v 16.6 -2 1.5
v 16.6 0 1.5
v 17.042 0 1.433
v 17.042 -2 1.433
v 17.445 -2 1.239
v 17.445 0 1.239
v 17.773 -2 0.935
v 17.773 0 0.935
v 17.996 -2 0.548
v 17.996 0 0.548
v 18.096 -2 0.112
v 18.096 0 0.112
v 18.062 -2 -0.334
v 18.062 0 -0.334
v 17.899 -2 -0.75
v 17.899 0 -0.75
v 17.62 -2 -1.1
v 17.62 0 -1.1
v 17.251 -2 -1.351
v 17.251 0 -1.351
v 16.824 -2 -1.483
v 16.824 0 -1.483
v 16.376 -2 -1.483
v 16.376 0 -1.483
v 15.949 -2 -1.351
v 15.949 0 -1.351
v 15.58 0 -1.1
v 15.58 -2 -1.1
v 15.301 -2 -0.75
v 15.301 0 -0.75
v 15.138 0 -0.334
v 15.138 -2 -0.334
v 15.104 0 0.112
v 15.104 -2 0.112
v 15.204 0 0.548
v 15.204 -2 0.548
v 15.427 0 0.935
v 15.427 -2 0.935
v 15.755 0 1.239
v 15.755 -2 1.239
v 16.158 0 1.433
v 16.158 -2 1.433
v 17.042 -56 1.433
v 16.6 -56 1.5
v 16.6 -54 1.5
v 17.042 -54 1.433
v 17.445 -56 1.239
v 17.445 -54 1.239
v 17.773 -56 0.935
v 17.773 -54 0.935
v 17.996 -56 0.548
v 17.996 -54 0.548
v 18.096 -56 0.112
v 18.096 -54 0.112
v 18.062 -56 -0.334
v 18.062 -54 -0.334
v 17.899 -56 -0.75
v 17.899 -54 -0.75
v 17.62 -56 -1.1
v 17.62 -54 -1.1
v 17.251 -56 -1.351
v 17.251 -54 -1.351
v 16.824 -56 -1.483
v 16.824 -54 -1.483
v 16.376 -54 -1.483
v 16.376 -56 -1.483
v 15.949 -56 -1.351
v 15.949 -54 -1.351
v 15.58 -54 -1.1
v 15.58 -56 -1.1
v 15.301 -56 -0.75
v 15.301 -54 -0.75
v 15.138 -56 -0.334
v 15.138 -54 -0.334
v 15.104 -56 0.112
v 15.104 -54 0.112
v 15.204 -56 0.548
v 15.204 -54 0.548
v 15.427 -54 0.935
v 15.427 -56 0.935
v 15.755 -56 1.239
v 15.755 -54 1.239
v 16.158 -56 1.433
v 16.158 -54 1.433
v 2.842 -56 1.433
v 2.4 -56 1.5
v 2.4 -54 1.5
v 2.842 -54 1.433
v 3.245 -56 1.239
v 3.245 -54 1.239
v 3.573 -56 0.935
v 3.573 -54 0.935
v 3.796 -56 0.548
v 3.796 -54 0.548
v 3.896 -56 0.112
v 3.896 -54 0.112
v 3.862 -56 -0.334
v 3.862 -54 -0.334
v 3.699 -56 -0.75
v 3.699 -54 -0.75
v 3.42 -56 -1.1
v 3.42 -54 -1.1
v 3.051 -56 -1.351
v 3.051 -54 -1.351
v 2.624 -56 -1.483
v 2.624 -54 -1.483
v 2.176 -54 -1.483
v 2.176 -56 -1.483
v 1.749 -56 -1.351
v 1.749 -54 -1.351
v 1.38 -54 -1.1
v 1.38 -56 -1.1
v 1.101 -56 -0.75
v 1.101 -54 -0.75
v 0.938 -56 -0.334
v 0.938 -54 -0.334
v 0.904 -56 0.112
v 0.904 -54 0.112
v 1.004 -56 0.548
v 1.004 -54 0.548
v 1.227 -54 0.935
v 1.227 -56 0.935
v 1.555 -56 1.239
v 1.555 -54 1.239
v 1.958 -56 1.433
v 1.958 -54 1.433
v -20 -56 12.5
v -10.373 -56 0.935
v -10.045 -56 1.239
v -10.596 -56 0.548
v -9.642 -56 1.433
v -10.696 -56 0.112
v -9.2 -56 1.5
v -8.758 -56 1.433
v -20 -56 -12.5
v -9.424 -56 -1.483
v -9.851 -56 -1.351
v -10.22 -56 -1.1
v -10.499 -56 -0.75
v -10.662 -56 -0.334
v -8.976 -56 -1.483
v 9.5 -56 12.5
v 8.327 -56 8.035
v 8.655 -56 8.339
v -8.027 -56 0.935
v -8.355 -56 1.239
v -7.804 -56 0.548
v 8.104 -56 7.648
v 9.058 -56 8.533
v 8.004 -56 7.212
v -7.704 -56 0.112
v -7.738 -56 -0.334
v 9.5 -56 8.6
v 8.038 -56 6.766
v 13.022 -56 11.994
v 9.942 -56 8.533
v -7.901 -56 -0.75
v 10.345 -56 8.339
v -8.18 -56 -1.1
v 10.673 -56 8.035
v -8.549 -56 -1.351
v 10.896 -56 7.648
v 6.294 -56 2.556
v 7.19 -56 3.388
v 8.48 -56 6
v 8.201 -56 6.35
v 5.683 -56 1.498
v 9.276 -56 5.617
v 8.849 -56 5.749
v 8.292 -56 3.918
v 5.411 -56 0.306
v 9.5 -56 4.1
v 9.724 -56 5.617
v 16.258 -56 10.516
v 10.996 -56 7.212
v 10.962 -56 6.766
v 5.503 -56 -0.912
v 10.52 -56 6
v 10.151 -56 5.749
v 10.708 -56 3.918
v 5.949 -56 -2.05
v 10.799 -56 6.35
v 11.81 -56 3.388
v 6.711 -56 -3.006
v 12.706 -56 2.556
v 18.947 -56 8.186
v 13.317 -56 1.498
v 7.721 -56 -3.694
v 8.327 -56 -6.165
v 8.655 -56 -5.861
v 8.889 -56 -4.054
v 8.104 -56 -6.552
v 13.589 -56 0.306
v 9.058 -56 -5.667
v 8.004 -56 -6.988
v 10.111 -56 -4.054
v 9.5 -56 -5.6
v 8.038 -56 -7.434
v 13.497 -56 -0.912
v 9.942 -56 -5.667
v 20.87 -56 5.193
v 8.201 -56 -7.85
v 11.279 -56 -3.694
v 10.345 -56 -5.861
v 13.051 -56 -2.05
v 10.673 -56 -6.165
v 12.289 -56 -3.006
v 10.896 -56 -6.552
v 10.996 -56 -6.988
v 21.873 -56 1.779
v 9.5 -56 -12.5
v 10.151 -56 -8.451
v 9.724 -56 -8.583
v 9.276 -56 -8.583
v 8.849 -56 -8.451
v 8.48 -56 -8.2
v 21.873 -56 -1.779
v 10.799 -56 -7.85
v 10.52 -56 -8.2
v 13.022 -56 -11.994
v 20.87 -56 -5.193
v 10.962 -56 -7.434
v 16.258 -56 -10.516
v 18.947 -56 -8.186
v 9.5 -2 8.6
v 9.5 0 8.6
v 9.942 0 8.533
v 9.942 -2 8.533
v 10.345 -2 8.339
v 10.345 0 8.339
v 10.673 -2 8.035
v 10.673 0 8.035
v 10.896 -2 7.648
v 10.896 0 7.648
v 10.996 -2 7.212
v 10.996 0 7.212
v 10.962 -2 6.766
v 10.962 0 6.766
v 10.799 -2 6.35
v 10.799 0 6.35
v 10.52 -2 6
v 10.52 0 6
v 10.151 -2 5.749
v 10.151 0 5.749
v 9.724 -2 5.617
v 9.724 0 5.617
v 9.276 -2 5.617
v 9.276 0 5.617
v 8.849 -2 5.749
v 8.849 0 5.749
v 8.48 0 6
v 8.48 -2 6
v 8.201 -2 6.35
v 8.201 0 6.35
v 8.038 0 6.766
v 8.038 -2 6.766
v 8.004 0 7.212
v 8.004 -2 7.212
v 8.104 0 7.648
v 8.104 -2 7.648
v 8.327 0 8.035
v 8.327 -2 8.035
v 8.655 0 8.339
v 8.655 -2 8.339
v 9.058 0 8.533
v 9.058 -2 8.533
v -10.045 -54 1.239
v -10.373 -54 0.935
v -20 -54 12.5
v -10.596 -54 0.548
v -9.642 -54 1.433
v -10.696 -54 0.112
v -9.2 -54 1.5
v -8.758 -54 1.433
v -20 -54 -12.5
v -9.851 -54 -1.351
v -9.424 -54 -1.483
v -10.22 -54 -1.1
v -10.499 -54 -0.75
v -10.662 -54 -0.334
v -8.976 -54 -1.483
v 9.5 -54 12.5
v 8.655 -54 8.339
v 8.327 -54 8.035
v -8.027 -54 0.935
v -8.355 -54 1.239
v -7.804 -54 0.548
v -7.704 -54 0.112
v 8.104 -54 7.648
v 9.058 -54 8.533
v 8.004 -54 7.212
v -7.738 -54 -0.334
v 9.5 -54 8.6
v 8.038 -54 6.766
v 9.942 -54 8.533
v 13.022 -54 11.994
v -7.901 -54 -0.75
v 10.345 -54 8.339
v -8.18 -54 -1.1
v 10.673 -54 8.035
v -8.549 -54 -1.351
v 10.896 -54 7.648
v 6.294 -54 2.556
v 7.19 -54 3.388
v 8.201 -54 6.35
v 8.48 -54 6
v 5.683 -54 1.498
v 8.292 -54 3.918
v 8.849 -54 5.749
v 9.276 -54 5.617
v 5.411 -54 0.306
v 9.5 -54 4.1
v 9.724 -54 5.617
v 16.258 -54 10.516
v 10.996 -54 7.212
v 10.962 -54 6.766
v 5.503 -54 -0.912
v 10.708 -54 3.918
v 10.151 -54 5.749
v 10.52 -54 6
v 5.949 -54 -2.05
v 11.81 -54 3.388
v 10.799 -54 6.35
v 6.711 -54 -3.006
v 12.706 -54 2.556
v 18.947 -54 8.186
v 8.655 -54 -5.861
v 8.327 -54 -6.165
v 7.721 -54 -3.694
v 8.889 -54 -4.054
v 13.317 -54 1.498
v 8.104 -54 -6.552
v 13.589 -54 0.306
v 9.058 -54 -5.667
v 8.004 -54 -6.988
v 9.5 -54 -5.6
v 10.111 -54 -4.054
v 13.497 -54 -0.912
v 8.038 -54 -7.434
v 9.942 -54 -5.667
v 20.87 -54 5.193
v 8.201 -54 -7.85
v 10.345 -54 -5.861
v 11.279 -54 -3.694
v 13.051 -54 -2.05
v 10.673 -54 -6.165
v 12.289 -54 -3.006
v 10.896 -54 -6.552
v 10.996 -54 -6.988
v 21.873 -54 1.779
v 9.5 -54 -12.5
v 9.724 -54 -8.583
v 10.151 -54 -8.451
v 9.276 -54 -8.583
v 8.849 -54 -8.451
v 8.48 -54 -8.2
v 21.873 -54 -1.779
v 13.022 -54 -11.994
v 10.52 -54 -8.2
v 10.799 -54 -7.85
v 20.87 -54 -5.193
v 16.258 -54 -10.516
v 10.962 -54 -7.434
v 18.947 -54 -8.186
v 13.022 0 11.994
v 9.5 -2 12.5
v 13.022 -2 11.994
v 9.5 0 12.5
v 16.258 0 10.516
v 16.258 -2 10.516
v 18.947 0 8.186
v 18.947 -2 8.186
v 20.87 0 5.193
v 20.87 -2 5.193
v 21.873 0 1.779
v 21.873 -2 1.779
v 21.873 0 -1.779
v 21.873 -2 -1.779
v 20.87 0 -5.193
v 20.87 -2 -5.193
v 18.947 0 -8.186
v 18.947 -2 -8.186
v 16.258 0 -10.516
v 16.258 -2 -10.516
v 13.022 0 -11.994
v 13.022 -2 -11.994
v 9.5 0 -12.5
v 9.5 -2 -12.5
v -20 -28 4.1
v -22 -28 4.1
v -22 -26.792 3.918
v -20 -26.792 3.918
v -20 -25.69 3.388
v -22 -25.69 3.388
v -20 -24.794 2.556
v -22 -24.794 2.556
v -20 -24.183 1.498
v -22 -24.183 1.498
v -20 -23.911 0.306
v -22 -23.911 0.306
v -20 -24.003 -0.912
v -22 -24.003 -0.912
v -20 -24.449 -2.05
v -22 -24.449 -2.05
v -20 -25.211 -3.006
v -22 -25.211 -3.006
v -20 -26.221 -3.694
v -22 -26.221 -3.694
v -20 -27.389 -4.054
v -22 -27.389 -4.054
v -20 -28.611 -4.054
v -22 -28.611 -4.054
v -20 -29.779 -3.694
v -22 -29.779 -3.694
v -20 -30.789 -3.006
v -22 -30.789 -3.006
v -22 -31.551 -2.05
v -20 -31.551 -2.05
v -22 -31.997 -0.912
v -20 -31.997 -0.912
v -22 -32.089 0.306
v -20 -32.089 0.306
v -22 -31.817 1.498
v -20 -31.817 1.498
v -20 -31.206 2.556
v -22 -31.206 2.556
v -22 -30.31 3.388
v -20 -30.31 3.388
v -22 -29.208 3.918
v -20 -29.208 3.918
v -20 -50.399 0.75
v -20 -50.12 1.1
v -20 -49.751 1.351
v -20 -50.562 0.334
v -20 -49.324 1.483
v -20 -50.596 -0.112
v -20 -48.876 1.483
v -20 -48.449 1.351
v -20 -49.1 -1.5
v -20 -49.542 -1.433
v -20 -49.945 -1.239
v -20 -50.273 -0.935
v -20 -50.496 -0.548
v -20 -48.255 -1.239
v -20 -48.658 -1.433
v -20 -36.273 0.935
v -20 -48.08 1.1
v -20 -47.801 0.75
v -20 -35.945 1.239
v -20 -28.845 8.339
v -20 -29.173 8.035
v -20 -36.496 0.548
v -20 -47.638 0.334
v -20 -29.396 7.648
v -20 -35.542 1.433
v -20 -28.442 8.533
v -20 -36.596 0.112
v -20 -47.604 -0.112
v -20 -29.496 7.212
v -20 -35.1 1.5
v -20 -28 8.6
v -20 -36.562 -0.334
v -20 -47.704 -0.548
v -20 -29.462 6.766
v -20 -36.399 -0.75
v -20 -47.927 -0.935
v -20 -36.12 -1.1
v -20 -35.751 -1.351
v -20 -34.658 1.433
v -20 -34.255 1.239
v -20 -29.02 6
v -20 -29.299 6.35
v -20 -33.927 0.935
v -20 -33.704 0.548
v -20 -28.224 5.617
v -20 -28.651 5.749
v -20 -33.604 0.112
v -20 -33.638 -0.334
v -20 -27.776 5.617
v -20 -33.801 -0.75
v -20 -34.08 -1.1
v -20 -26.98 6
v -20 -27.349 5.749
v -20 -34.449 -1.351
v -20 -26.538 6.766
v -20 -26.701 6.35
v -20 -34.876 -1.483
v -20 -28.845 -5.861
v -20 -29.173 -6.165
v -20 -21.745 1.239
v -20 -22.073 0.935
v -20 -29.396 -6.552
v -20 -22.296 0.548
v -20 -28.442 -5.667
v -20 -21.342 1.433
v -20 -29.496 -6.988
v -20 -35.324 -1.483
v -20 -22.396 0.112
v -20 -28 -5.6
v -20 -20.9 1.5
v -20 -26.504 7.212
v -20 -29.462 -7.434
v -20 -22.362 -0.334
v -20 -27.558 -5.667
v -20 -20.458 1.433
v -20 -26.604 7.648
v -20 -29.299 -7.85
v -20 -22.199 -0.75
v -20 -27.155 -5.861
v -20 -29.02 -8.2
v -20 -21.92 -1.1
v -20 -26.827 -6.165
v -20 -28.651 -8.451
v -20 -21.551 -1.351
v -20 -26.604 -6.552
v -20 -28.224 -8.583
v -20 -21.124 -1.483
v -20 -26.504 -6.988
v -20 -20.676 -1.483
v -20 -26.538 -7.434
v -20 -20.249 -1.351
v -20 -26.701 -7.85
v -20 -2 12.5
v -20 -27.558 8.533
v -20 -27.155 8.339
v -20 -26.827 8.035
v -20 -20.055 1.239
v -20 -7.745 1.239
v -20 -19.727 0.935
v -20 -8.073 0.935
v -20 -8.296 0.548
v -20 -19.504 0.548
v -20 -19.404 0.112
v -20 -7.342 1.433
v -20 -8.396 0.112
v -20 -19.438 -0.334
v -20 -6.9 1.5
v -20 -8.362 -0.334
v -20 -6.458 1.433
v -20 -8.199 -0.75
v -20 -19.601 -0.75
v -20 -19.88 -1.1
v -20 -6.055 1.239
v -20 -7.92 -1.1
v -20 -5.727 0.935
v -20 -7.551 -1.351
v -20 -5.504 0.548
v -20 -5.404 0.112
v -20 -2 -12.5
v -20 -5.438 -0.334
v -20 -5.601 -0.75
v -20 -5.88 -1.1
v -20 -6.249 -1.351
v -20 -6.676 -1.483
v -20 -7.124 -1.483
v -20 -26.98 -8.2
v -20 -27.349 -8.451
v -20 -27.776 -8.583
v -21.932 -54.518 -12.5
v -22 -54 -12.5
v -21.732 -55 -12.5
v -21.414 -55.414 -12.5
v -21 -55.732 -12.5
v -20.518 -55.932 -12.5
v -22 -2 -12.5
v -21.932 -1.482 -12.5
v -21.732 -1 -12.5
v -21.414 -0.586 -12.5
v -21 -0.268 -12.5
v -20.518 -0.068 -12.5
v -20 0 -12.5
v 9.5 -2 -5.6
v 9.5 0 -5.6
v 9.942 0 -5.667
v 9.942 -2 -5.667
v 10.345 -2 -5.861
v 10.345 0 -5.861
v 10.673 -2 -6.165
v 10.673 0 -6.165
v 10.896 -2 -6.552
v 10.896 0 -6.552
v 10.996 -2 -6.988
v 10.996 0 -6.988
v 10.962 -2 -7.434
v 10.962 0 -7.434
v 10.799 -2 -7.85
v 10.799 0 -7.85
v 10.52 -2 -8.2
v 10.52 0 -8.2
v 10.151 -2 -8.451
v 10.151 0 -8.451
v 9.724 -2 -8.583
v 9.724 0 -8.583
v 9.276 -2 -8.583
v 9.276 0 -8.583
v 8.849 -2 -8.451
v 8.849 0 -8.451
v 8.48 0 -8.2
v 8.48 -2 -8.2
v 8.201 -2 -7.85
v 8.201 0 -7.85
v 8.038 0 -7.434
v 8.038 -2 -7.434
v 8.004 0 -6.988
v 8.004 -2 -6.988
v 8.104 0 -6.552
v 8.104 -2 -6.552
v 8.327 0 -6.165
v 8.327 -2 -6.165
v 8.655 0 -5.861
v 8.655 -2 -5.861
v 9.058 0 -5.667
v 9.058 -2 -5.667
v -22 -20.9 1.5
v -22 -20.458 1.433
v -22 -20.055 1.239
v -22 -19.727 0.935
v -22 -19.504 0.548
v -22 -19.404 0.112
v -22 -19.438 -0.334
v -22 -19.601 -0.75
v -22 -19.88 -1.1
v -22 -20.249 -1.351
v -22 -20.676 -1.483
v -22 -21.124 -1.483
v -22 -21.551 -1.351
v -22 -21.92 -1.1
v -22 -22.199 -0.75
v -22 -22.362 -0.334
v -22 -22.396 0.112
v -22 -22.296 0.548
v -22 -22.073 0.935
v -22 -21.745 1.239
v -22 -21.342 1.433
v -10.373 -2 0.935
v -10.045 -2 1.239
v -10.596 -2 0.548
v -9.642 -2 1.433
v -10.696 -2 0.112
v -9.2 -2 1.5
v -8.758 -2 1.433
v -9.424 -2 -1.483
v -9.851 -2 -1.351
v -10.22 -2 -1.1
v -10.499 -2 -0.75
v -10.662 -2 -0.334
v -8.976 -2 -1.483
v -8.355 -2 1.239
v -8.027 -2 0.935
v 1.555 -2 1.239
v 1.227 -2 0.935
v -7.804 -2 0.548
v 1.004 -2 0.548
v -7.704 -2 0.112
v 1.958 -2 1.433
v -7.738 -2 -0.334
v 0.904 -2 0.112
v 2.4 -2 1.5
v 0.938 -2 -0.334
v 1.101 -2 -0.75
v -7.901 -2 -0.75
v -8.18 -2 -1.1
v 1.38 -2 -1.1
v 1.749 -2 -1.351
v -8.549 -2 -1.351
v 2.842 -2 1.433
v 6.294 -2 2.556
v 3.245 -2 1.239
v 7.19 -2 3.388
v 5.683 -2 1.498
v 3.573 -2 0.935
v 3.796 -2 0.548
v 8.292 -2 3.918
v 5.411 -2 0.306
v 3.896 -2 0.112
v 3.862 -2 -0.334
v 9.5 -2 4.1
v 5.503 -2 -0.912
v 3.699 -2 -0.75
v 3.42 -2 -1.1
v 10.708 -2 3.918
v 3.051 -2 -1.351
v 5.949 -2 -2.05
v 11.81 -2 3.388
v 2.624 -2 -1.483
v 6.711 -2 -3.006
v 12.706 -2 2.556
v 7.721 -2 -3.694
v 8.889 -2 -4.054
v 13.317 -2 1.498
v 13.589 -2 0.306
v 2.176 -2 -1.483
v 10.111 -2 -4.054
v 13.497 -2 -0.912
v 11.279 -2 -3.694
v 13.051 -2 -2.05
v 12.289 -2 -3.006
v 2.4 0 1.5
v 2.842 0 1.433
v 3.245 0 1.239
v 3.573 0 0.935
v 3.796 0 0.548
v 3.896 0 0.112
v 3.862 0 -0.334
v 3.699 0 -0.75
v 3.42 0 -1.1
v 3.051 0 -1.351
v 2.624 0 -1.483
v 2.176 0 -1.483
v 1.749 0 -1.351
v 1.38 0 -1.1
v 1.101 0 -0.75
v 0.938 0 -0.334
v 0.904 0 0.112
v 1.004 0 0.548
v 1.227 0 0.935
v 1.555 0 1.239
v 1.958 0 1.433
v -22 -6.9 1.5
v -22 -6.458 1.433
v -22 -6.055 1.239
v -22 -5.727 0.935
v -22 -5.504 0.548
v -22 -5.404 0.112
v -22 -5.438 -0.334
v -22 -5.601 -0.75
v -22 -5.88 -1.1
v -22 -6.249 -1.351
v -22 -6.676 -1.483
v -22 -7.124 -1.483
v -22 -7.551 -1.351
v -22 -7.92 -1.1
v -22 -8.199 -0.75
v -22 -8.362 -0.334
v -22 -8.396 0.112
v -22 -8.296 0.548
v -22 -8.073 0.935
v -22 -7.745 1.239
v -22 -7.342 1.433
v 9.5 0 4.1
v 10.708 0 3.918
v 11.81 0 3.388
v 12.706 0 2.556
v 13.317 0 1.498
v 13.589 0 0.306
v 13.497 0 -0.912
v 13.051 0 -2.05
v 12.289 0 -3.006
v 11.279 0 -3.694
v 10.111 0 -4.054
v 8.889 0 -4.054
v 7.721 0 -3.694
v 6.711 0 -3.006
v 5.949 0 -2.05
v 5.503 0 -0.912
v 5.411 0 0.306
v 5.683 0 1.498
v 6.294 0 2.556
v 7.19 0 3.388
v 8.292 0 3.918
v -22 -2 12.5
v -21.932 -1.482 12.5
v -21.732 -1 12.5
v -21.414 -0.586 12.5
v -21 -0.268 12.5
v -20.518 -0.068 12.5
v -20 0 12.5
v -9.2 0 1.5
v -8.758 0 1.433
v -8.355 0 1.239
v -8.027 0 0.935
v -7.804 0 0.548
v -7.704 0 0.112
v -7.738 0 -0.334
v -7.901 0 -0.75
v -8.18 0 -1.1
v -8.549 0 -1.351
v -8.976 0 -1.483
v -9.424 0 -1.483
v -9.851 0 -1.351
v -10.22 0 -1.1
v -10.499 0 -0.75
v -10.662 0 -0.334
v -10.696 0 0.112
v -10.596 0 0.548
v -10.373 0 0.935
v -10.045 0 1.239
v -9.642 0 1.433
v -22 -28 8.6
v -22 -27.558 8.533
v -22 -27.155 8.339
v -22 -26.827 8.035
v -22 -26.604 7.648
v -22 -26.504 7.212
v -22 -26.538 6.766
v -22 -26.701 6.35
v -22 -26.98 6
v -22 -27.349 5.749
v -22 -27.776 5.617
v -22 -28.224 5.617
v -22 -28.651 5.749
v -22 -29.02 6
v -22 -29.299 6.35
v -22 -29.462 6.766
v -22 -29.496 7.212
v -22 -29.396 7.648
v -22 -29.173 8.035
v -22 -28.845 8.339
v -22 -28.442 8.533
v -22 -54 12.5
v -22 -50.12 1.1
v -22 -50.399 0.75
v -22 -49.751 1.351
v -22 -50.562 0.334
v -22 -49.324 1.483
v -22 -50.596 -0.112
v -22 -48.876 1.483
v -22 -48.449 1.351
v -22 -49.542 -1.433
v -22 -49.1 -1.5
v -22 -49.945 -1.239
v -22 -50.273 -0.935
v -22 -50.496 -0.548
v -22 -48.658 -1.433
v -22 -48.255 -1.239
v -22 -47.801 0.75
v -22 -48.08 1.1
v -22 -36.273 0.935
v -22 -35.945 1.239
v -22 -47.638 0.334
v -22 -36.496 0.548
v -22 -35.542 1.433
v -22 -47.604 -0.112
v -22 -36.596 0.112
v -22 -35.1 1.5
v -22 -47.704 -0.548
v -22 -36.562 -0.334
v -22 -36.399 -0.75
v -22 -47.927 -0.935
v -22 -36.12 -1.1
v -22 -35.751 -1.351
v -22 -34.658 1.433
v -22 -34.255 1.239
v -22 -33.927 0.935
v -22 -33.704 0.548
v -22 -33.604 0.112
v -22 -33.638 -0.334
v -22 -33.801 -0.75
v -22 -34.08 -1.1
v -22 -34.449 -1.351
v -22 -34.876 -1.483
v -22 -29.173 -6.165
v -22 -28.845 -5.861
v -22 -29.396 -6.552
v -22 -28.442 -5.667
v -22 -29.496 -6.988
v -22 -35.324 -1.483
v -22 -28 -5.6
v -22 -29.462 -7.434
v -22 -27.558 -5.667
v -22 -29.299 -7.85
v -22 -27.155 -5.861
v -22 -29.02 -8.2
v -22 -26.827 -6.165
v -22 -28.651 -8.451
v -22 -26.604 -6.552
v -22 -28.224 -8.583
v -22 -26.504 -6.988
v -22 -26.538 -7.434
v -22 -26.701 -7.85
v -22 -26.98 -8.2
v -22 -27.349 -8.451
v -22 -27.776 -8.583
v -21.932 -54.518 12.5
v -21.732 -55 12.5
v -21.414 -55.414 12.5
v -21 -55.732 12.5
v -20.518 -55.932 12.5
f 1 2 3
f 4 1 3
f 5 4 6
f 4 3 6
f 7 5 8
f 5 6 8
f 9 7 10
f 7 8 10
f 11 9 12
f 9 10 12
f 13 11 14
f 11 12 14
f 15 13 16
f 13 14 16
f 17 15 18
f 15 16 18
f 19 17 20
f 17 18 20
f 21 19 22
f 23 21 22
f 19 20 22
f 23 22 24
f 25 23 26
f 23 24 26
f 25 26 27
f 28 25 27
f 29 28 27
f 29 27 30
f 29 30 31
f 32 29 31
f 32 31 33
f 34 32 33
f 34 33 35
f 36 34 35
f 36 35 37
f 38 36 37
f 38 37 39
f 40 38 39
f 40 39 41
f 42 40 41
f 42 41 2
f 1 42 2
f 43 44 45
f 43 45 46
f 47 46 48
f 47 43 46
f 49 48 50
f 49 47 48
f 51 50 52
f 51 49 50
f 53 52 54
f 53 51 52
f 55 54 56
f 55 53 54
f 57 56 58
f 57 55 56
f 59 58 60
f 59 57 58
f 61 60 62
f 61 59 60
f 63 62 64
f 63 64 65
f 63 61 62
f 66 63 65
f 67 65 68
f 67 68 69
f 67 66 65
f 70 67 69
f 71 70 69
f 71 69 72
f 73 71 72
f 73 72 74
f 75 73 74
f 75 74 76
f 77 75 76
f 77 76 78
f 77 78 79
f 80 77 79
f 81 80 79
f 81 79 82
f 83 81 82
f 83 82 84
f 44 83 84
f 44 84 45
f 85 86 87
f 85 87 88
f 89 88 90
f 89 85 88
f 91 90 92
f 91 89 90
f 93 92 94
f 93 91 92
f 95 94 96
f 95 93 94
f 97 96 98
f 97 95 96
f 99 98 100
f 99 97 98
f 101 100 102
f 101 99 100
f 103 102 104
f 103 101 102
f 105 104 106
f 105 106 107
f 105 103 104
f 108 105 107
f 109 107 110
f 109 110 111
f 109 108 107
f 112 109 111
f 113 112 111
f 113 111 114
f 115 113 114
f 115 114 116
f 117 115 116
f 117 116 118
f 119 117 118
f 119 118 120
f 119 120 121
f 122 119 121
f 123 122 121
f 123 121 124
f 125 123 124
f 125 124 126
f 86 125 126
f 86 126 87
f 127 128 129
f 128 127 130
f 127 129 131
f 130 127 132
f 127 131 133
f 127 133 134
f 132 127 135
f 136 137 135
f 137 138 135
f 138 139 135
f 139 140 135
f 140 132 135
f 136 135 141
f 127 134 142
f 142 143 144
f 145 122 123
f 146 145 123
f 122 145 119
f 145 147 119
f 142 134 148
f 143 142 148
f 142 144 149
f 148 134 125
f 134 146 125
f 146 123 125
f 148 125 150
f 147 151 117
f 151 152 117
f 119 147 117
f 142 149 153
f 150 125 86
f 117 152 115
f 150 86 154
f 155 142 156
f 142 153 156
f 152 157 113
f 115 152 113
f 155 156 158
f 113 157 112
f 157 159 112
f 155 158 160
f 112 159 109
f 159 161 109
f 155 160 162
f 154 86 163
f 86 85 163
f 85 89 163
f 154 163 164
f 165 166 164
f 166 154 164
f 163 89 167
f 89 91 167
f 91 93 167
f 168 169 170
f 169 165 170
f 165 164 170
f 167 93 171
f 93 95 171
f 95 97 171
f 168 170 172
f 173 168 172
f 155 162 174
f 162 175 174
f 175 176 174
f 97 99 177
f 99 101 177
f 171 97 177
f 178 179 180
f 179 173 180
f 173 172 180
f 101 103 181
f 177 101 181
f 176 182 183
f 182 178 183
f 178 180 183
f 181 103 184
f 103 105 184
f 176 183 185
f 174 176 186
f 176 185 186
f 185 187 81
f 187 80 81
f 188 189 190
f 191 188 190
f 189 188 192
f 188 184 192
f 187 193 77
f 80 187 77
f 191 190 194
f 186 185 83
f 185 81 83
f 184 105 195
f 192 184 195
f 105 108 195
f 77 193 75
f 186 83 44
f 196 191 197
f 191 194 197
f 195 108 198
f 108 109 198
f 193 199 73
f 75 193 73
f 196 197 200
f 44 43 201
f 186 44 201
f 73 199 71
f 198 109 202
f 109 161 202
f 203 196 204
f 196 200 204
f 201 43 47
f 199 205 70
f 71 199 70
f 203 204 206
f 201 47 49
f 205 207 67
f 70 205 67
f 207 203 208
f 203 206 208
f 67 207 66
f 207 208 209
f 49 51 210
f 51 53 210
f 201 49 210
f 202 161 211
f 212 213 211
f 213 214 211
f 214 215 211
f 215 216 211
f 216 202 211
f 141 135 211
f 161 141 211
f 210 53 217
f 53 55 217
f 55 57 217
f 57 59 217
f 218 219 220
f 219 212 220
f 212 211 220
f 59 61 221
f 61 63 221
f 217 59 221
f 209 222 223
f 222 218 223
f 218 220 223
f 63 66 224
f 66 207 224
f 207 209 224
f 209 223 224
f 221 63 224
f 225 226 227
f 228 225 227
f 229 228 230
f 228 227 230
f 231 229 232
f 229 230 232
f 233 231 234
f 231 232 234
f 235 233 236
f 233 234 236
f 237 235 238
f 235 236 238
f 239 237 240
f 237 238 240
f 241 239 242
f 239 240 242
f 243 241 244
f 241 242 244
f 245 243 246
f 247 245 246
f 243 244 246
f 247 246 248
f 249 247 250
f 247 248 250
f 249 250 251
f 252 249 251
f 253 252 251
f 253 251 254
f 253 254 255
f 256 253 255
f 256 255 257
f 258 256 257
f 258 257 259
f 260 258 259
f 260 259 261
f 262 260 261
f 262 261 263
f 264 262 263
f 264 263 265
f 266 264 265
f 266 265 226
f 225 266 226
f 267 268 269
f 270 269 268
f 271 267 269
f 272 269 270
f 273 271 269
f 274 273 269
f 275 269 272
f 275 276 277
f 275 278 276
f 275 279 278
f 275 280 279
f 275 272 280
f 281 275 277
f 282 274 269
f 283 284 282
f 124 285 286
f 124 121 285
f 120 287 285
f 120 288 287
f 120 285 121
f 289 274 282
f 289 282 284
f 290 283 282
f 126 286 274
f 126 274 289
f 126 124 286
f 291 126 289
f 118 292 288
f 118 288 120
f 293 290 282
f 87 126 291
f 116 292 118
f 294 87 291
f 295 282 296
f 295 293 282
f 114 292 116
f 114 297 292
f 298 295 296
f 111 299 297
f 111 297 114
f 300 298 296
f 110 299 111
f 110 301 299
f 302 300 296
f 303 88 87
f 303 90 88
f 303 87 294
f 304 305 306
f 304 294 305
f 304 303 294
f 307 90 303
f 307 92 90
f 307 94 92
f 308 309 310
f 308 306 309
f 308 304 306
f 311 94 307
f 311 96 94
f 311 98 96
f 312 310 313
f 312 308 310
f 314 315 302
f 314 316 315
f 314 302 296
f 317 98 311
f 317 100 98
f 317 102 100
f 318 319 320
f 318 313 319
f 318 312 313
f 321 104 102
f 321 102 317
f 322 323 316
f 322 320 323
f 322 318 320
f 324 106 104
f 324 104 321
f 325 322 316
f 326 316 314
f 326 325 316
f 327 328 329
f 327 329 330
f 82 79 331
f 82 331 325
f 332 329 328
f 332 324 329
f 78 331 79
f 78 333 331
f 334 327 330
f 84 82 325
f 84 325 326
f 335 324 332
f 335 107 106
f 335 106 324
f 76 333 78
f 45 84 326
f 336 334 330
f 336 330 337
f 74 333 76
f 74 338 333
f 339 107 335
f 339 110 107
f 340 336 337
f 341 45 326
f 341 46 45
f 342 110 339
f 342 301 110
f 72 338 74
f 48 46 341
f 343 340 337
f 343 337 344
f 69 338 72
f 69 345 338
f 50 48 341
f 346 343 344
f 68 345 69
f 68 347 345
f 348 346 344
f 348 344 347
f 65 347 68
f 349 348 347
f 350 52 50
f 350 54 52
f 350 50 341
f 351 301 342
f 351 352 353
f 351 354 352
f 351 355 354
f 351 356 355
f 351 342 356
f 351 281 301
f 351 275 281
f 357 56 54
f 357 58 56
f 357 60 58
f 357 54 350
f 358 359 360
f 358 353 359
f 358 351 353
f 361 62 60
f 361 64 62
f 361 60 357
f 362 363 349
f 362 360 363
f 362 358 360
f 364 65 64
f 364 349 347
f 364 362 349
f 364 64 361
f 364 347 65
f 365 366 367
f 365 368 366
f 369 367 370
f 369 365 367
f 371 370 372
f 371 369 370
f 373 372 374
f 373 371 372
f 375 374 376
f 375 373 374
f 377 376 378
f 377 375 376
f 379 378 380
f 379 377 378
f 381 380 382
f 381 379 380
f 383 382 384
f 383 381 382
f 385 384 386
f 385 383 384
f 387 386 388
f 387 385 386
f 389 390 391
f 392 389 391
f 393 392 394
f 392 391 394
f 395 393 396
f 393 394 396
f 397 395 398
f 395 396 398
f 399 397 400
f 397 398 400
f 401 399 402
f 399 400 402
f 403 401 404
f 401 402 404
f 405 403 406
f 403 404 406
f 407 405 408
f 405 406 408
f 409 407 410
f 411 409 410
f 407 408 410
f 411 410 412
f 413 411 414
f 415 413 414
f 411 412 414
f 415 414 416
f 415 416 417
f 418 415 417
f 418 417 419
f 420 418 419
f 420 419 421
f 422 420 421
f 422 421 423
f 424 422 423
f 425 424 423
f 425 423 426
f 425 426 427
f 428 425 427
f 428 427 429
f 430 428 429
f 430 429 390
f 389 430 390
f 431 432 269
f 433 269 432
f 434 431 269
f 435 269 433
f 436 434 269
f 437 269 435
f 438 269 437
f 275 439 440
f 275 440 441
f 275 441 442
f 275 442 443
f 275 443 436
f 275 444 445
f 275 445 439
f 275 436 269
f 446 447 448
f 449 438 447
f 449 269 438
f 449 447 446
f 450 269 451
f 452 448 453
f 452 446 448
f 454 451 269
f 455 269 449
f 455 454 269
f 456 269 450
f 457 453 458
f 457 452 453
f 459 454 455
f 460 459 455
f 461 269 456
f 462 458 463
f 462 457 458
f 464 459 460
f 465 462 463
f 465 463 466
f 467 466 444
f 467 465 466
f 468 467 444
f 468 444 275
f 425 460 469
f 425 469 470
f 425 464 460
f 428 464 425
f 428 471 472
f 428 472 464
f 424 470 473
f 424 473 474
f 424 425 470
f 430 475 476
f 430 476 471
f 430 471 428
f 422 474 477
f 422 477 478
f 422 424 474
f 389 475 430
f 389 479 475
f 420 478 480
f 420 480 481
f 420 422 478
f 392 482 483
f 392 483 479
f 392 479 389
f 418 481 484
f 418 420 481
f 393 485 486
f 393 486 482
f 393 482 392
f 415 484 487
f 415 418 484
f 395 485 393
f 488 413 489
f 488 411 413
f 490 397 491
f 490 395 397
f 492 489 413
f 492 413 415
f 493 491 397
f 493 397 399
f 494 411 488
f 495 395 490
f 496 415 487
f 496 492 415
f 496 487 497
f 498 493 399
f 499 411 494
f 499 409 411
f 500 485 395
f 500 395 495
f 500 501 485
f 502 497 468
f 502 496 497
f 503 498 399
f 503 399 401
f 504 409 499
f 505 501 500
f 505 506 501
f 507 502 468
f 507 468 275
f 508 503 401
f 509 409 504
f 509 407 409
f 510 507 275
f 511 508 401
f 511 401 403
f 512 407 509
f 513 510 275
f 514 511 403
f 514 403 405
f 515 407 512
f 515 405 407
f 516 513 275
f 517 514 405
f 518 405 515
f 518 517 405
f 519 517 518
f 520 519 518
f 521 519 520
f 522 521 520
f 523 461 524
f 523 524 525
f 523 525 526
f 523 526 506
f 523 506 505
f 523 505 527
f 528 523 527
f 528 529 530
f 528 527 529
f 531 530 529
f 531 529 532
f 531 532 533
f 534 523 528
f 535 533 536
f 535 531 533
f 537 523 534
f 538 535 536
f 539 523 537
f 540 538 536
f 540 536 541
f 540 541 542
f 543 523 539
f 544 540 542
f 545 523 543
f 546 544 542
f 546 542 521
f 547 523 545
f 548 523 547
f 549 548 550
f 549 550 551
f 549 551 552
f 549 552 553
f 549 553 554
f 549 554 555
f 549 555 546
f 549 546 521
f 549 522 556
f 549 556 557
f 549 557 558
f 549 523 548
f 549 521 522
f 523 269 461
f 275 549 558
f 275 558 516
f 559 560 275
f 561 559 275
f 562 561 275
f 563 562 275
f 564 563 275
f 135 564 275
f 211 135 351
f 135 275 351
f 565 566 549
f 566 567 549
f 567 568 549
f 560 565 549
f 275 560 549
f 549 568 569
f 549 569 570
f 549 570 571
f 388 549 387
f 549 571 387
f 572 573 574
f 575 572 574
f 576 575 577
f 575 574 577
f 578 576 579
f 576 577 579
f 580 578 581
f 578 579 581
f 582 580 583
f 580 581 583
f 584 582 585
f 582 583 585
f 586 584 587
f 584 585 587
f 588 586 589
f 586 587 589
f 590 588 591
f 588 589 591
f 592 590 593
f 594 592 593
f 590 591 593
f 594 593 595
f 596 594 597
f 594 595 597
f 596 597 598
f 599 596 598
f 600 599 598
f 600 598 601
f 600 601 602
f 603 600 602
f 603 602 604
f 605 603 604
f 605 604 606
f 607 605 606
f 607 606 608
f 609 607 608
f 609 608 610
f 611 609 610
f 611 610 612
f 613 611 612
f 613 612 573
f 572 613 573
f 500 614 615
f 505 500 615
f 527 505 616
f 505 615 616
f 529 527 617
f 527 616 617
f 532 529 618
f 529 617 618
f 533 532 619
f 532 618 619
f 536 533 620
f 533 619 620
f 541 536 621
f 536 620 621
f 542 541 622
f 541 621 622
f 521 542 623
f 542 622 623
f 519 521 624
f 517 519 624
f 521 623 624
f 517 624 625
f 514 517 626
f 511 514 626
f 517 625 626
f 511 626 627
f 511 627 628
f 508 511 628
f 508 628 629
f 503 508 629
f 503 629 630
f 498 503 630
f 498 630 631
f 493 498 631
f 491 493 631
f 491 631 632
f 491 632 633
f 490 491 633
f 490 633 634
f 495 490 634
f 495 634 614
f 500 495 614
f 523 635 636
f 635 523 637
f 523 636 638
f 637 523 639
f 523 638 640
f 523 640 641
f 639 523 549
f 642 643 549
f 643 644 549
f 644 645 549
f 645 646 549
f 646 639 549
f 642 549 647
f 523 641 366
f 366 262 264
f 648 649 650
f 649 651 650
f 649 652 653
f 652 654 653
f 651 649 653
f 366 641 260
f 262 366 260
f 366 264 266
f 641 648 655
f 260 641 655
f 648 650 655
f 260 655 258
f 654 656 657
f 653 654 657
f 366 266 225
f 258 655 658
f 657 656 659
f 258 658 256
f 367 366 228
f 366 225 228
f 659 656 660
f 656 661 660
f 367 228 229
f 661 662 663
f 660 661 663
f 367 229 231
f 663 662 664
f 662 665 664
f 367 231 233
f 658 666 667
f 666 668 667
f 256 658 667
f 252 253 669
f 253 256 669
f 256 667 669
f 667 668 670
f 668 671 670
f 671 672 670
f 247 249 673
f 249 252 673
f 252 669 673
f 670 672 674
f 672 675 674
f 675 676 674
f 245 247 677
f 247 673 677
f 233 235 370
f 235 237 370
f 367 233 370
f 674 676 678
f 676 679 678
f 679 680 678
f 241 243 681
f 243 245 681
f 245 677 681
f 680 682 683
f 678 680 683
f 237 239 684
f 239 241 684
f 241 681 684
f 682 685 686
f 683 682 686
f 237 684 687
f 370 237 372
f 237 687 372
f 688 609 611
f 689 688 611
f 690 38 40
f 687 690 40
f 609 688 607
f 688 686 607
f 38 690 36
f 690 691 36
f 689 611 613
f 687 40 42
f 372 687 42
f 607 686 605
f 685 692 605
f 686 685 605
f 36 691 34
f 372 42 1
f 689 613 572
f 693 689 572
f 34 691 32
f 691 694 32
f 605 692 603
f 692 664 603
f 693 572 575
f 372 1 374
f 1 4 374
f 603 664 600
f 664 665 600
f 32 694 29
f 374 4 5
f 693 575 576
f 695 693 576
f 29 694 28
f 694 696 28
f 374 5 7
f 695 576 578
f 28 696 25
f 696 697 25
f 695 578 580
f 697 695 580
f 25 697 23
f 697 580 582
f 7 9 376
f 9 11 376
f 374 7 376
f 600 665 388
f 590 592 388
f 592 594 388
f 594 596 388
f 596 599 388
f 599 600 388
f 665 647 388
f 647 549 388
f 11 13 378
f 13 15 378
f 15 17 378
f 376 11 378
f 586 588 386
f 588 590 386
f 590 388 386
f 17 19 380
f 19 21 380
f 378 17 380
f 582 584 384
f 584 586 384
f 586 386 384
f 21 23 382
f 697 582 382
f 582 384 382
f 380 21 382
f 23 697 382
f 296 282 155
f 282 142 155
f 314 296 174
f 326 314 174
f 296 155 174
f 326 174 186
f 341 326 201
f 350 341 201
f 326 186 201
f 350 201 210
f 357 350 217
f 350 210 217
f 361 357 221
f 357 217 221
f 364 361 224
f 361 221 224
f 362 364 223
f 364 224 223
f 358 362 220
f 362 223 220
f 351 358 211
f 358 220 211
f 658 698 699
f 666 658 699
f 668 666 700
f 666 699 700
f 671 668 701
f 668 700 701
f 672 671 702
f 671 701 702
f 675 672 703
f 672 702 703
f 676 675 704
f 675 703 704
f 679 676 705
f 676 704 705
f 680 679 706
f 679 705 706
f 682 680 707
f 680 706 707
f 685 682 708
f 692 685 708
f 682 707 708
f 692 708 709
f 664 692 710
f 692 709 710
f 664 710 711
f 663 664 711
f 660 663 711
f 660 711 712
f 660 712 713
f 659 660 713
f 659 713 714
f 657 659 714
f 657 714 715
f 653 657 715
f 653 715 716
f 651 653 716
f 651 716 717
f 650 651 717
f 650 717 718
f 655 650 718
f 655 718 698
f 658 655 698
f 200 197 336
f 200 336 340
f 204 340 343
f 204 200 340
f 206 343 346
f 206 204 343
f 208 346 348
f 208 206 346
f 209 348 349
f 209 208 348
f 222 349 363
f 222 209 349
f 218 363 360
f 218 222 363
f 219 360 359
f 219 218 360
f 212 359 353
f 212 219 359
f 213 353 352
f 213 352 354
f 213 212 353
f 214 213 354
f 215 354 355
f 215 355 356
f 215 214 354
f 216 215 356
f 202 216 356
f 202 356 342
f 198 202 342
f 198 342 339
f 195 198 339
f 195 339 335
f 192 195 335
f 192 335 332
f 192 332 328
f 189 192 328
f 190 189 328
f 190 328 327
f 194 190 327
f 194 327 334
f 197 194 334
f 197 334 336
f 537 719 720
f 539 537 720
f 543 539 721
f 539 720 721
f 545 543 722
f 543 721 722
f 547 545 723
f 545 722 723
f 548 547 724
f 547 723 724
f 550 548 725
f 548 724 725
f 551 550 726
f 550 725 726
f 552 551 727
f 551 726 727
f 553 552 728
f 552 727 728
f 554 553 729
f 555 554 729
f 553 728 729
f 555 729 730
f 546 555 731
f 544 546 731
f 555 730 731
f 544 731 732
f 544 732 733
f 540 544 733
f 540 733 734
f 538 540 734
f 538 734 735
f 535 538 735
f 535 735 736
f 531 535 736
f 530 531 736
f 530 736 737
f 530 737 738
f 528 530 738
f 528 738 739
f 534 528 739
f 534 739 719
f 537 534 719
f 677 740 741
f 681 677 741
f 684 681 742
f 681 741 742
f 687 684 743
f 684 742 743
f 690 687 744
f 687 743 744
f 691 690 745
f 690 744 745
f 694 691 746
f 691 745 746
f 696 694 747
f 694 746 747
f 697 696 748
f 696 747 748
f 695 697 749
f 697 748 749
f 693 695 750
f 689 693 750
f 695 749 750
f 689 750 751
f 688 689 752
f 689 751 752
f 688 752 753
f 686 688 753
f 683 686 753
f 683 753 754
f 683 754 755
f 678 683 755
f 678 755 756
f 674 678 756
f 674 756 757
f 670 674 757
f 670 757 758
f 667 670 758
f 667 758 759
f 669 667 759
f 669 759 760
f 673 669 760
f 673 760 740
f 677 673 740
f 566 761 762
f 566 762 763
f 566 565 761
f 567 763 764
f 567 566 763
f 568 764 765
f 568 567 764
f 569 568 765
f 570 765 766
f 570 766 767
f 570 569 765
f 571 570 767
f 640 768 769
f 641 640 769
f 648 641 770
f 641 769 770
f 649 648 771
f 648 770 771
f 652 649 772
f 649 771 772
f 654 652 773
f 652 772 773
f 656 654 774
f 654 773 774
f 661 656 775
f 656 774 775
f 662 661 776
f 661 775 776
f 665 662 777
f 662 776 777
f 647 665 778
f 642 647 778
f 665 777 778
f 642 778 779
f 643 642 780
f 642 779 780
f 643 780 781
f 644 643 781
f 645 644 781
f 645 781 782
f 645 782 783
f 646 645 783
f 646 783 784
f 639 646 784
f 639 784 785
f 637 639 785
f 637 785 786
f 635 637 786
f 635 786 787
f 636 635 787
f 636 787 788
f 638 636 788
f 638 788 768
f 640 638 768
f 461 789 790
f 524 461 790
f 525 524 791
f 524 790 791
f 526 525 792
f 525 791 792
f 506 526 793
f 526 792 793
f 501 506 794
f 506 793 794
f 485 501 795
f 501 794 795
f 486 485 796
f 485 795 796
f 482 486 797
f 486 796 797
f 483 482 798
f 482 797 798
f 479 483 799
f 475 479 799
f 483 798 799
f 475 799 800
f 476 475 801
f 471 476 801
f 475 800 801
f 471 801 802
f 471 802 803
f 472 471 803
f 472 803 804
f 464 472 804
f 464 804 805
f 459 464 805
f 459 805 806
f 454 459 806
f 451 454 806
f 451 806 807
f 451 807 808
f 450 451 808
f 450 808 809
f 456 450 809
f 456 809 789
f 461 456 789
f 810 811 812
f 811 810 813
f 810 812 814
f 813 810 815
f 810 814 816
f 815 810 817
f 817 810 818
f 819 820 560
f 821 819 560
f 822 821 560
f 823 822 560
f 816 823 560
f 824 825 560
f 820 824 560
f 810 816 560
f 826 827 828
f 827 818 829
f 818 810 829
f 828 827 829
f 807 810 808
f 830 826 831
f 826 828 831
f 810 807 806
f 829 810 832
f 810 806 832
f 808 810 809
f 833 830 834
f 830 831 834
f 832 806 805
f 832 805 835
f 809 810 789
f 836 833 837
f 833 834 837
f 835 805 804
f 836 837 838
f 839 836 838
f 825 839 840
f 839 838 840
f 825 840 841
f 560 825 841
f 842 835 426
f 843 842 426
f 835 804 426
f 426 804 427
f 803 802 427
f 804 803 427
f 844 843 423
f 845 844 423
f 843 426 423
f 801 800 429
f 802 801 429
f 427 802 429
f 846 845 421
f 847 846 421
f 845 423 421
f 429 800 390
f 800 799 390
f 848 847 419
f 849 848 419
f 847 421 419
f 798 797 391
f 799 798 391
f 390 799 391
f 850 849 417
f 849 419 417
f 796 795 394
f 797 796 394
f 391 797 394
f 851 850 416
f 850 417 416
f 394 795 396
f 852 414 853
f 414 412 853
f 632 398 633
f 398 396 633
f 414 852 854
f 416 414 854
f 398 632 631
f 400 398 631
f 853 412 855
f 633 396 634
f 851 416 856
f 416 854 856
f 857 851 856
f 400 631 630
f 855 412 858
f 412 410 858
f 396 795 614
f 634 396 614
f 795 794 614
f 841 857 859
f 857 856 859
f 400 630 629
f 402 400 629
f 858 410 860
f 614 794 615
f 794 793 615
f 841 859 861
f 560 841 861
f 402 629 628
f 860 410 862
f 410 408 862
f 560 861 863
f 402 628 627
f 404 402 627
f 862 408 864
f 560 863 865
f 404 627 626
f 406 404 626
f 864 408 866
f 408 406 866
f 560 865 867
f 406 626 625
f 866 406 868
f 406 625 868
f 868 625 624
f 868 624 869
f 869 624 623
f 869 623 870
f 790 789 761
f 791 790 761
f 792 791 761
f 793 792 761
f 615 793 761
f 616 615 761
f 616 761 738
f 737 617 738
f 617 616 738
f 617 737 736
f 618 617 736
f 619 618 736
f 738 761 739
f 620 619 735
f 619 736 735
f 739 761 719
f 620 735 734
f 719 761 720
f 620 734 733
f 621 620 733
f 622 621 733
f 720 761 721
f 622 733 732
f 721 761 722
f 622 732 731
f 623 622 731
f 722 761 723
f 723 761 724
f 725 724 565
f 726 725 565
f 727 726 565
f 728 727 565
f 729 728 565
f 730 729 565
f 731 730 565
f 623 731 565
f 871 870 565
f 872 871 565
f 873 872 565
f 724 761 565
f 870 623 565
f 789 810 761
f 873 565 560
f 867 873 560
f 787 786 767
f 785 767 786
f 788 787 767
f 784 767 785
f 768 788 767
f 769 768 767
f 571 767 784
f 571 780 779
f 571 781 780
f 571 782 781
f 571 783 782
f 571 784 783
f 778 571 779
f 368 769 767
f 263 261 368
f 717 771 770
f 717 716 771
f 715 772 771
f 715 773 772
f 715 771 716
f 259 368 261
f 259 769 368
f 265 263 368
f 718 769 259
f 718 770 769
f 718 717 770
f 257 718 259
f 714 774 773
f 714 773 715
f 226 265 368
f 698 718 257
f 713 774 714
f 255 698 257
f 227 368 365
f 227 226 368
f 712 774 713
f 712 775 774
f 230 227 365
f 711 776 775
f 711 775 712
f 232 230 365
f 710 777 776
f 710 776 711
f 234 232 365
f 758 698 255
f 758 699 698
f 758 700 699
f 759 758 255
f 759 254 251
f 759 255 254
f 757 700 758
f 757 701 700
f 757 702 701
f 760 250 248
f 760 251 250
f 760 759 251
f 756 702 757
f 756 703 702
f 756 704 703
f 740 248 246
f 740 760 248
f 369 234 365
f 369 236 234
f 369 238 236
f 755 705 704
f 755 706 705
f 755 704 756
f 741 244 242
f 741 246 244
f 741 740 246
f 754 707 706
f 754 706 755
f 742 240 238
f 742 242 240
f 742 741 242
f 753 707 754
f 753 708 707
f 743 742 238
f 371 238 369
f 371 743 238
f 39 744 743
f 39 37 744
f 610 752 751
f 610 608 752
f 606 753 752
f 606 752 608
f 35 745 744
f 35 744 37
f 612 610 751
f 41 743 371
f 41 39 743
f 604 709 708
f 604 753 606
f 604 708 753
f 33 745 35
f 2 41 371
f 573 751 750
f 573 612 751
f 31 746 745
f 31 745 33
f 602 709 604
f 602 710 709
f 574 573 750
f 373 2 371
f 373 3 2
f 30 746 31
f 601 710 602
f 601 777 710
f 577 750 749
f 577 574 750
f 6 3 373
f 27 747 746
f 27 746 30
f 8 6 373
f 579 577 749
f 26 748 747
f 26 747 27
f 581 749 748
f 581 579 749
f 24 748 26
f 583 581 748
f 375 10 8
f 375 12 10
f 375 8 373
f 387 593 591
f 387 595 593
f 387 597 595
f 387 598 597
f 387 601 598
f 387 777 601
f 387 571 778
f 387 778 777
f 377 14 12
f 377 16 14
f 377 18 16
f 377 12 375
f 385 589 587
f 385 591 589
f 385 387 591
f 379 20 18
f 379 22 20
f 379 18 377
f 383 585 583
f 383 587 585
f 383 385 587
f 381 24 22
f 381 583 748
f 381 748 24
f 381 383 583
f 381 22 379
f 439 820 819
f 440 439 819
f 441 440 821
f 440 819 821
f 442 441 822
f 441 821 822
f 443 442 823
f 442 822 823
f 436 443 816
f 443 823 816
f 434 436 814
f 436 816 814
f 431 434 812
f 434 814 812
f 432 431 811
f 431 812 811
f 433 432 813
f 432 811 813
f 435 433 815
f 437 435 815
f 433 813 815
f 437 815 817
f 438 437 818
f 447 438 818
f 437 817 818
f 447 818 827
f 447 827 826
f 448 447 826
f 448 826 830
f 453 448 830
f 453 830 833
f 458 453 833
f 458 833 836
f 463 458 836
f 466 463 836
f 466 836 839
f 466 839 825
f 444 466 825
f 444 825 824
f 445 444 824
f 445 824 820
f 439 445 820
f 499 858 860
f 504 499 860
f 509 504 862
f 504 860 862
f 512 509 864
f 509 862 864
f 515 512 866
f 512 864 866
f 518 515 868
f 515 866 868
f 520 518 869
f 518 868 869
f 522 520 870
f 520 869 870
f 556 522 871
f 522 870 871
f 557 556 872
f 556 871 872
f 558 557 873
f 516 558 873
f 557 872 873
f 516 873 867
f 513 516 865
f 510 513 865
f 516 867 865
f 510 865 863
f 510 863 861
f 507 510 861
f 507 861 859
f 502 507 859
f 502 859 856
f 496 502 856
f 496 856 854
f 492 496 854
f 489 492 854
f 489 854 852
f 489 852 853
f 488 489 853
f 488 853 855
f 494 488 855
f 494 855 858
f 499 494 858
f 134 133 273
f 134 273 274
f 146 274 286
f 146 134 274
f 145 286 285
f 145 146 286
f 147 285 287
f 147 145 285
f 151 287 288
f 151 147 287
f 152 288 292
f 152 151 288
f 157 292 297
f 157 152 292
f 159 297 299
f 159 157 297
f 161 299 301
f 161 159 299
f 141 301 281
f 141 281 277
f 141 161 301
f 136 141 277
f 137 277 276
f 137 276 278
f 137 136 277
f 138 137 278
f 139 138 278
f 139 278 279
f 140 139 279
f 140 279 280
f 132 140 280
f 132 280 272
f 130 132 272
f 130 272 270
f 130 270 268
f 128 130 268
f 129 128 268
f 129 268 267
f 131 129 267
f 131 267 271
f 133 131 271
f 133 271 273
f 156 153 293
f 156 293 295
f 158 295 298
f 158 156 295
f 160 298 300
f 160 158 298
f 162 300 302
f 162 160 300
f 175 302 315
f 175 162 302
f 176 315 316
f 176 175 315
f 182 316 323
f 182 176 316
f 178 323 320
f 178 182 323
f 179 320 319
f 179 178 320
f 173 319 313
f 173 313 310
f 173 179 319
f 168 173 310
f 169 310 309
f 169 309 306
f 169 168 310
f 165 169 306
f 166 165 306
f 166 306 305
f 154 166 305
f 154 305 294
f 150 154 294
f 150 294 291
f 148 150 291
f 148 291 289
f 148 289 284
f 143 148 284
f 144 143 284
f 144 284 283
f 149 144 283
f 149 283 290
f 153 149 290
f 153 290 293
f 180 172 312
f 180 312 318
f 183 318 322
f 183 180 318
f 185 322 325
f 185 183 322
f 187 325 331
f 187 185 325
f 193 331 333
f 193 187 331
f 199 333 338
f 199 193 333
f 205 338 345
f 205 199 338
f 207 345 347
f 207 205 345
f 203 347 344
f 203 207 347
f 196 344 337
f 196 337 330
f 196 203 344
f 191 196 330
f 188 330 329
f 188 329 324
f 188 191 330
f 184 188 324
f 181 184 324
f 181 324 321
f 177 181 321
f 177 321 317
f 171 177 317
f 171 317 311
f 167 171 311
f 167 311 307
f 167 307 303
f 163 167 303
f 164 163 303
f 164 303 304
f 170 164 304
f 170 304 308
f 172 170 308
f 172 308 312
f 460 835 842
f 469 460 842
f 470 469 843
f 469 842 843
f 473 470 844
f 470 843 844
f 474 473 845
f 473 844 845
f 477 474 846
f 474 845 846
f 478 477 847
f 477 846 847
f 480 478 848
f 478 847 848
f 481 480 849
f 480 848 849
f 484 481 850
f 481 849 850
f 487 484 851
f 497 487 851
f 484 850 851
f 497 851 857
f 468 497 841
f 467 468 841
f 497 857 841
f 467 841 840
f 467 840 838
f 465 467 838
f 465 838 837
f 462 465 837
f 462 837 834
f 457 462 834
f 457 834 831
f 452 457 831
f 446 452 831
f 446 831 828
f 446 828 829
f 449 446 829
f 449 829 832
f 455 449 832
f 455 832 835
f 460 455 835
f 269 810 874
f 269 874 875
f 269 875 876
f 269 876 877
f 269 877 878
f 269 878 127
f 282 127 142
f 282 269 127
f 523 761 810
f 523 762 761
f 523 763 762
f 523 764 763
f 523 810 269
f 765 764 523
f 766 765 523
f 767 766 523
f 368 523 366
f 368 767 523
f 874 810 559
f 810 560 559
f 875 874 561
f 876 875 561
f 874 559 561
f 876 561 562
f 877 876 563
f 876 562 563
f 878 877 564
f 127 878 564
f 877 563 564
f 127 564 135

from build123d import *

# Parameters (mm, degrees)
SKETCH_1_W          = 44
SKETCH_1_H          = 25
EXTRUDE_1_DEPTH     = 2
SKETCH_2_W          = 2
SKETCH_2_H          = 25
EXTRUDE_2_DEPTH     = 56
FILLET_1_RADIUS     = 12.5
FILLET_1_LENGTH     = 2
CUT_EXTRUDE_2_REACH = 63.451
SKETCH_3_R          = 4.1
SKETCH_3_R_2        = 1.5
CUT_EXTRUDE_3_REACH = 74.307
SKETCH_4_R          = 4.1
SKETCH_4_R_2        = 1.5
FILLET_2_R          = 2


with BuildPart() as part:
    # 草图1 → 凸台-拉伸1 (new body)
    with BuildSketch(Plane(origin=(0, 0, 0), x_dir=(1, 0, 0), z_dir=(0, 1, 0))):
        Rectangle(SKETCH_1_W, SKETCH_1_H)
    extrude(amount=-EXTRUDE_1_DEPTH)

    # 草图2 → 凸台-拉伸2 (add)
    with BuildSketch(Plane(origin=(0, 0, 0), x_dir=(1, 0, 0), z_dir=(0, 1, 0))):
        with Locations((-21, 0)):
            Rectangle(SKETCH_2_W, SKETCH_2_H)
    extrude(amount=-EXTRUDE_2_DEPTH)

    # 圆角1: full round fillet: the end face becomes a half cylinder, R = half its width
    fillet_1_face = Plane((22, -1, 0), x_dir=(0, 1, 0), z_dir=(1, 0, 0))  # on the end face: x along it, z out of the body
    fillet_1_slab = fillet_1_face.offset(-FILLET_1_RADIUS / 2) * Box(FILLET_1_LENGTH, 2 * FILLET_1_RADIUS, FILLET_1_RADIUS, mode=Mode.PRIVATE)  # the body's end, R deep
    fillet_1_round = Plane((9.5, -1, 0), x_dir=(1, 0, 0), z_dir=(0, 1, 0)) * Cylinder(FILLET_1_RADIUS, FILLET_1_LENGTH, mode=Mode.PRIVATE)  # its axis R under the face
    add(fillet_1_slab - fillet_1_round, mode=Mode.SUBTRACT)

    # 草图3 → 切除-拉伸2 (cut, up to next)
    with BuildSketch(Plane(origin=(0, 0, 0), x_dir=(1, 0, 0), z_dir=(0, 1, 0)), mode=Mode.PRIVATE) as cut_extrude_2_sk1:
        with Locations(Location((9.5, 0, 0), (0, 0, 270))):
            Circle(SKETCH_3_R)
    cut_extrude_2_tool1 = extrude(cut_extrude_2_sk1.sketch, amount=-CUT_EXTRUDE_2_REACH, mode=Mode.PRIVATE) & part.part
    # 草图3 → 切除-拉伸2 (cut, up to next)
    with BuildSketch(Plane(origin=(0, 0, 0), x_dir=(1, 0, 0), z_dir=(0, 1, 0)), mode=Mode.PRIVATE) as cut_extrude_2_sk2:
        with Locations(Location((2.4, 0, 0), (0, 0, 270))):
            Circle(SKETCH_3_R_2)
    cut_extrude_2_tool2 = extrude(cut_extrude_2_sk2.sketch, amount=-CUT_EXTRUDE_2_REACH, mode=Mode.PRIVATE) & part.part
    # 草图3 → 切除-拉伸2 (cut, up to next)
    with BuildSketch(Plane(origin=(0, 0, 0), x_dir=(1, 0, 0), z_dir=(0, 1, 0)), mode=Mode.PRIVATE) as cut_extrude_2_sk3:
        with Locations(Location((9.5, 7.1, 0), (0, 0, 270))):
            Circle(SKETCH_3_R_2)
    cut_extrude_2_tool3 = extrude(cut_extrude_2_sk3.sketch, amount=-CUT_EXTRUDE_2_REACH, mode=Mode.PRIVATE) & part.part
    # 草图3 → 切除-拉伸2 (cut, up to next)
    with BuildSketch(Plane(origin=(0, 0, 0), x_dir=(1, 0, 0), z_dir=(0, 1, 0)), mode=Mode.PRIVATE) as cut_extrude_2_sk4:
        with Locations(Location((16.6, 0, 0), (0, 0, 270))):
            Circle(SKETCH_3_R_2)
    cut_extrude_2_tool4 = extrude(cut_extrude_2_sk4.sketch, amount=-CUT_EXTRUDE_2_REACH, mode=Mode.PRIVATE) & part.part
    # 草图3 → 切除-拉伸2 (cut, up to next)
    with BuildSketch(Plane(origin=(0, 0, 0), x_dir=(1, 0, 0), z_dir=(0, 1, 0)), mode=Mode.PRIVATE) as cut_extrude_2_sk5:
        with Locations(Location((9.5, -7.1, 0), (0, 0, 270))):
            Circle(SKETCH_3_R_2)
    cut_extrude_2_tool5 = extrude(cut_extrude_2_sk5.sketch, amount=-CUT_EXTRUDE_2_REACH, mode=Mode.PRIVATE) & part.part
    # 草图3 → 切除-拉伸2 (cut, up to next)
    with BuildSketch(Plane(origin=(0, 0, 0), x_dir=(1, 0, 0), z_dir=(0, 1, 0)), mode=Mode.PRIVATE) as cut_extrude_2_sk6:
        with Locations(Location((-9.2, 0, 0), (0, 0, 270))):
            Circle(SKETCH_3_R_2)
    cut_extrude_2_tool6 = extrude(cut_extrude_2_sk6.sketch, amount=-CUT_EXTRUDE_2_REACH, mode=Mode.PRIVATE) & part.part
    add(cut_extrude_2_tool1.solids().sort_by_distance((9.5, 0, 0))[0], mode=Mode.SUBTRACT)
    add(cut_extrude_2_tool2.solids().sort_by_distance((2.4, 0, 0))[0], mode=Mode.SUBTRACT)
    add(cut_extrude_2_tool3.solids().sort_by_distance((9.5, 0, -7.1))[0], mode=Mode.SUBTRACT)
    add(cut_extrude_2_tool4.solids().sort_by_distance((16.6, 0, 0))[0], mode=Mode.SUBTRACT)
    add(cut_extrude_2_tool5.solids().sort_by_distance((9.5, 0, 7.1))[0], mode=Mode.SUBTRACT)
    add(cut_extrude_2_tool6.solids().sort_by_distance((-9.2, 0, 0))[0], mode=Mode.SUBTRACT)

    # 镜向2: part across plane


with BuildPart() as part_1:
    add(part.part)
    add(part.part.mirror(Plane.ZX.offset(-28)))

    # 草图4 → 切除-拉伸3 (cut, up to next)
    with BuildSketch(Plane.ZY.offset(22), mode=Mode.PRIVATE) as cut_extrude_3_sk1:
        with Locations((0, -28)):
            Circle(SKETCH_4_R)
    cut_extrude_3_tool1 = extrude(cut_extrude_3_sk1.sketch, amount=-CUT_EXTRUDE_3_REACH, mode=Mode.PRIVATE) & part_1.part
    # 草图4 → 切除-拉伸3 (cut, up to next)
    with BuildSketch(Plane.ZY.offset(22), mode=Mode.PRIVATE) as cut_extrude_3_sk2:
        with Locations((0, -20.9)):
            Circle(SKETCH_4_R_2)
    cut_extrude_3_tool2 = extrude(cut_extrude_3_sk2.sketch, amount=-CUT_EXTRUDE_3_REACH, mode=Mode.PRIVATE) & part_1.part
    # 草图4 → 切除-拉伸3 (cut, up to next)
    with BuildSketch(Plane.ZY.offset(22), mode=Mode.PRIVATE) as cut_extrude_3_sk3:
        with Locations((7.1, -28)):
            Circle(SKETCH_4_R_2)
    cut_extrude_3_tool3 = extrude(cut_extrude_3_sk3.sketch, amount=-CUT_EXTRUDE_3_REACH, mode=Mode.PRIVATE) & part_1.part
    # 草图4 → 切除-拉伸3 (cut, up to next)
    with BuildSketch(Plane.ZY.offset(22), mode=Mode.PRIVATE) as cut_extrude_3_sk4:
        with Locations((0, -35.1)):
            Circle(SKETCH_4_R_2)
    cut_extrude_3_tool4 = extrude(cut_extrude_3_sk4.sketch, amount=-CUT_EXTRUDE_3_REACH, mode=Mode.PRIVATE) & part_1.part
    # 草图4 → 切除-拉伸3 (cut, up to next)
    with BuildSketch(Plane.ZY.offset(22), mode=Mode.PRIVATE) as cut_extrude_3_sk5:
        with Locations((-7.1, -28)):
            Circle(SKETCH_4_R_2)
    cut_extrude_3_tool5 = extrude(cut_extrude_3_sk5.sketch, amount=-CUT_EXTRUDE_3_REACH, mode=Mode.PRIVATE) & part_1.part
    # 草图4 → 切除-拉伸3 (cut, up to next)
    with BuildSketch(Plane.ZY.offset(22), mode=Mode.PRIVATE) as cut_extrude_3_sk6:
        with Locations((0, -6.9)):
            Circle(SKETCH_4_R_2)
    cut_extrude_3_tool6 = extrude(cut_extrude_3_sk6.sketch, amount=-CUT_EXTRUDE_3_REACH, mode=Mode.PRIVATE) & part_1.part
    # 草图4 → 切除-拉伸3 (cut, up to next)
    with BuildSketch(Plane.ZY.offset(22), mode=Mode.PRIVATE) as cut_extrude_3_sk7:
        with Locations(Location((0, -49.1, 0), (0, 0, 180))):
            Circle(SKETCH_4_R_2)
    cut_extrude_3_tool7 = extrude(cut_extrude_3_sk7.sketch, amount=-CUT_EXTRUDE_3_REACH, mode=Mode.PRIVATE) & part_1.part
    add(cut_extrude_3_tool1.solids().sort_by_distance((-22, -28, 0))[0], mode=Mode.SUBTRACT)
    add(cut_extrude_3_tool2.solids().sort_by_distance((-22, -20.9, 0))[0], mode=Mode.SUBTRACT)
    add(cut_extrude_3_tool3.solids().sort_by_distance((-22, -28, 7.1))[0], mode=Mode.SUBTRACT)
    add(cut_extrude_3_tool4.solids().sort_by_distance((-22, -35.1, 0))[0], mode=Mode.SUBTRACT)
    add(cut_extrude_3_tool5.solids().sort_by_distance((-22, -28, -7.1))[0], mode=Mode.SUBTRACT)
    add(cut_extrude_3_tool6.solids().sort_by_distance((-22, -6.9, 0))[0], mode=Mode.SUBTRACT)
    add(cut_extrude_3_tool7.solids().sort_by_distance((-22, -49.1, 0))[0], mode=Mode.SUBTRACT)

    # 圆角2
    fillet_2_edges = [part_1.edges().sort_by_distance(p)[0] for p in [
        (-22, -56, 0),
        (-22, 0, 0),
    ]]
    fillet(fillet_2_edges, radius=FILLET_2_R)


solid = part_1.part
